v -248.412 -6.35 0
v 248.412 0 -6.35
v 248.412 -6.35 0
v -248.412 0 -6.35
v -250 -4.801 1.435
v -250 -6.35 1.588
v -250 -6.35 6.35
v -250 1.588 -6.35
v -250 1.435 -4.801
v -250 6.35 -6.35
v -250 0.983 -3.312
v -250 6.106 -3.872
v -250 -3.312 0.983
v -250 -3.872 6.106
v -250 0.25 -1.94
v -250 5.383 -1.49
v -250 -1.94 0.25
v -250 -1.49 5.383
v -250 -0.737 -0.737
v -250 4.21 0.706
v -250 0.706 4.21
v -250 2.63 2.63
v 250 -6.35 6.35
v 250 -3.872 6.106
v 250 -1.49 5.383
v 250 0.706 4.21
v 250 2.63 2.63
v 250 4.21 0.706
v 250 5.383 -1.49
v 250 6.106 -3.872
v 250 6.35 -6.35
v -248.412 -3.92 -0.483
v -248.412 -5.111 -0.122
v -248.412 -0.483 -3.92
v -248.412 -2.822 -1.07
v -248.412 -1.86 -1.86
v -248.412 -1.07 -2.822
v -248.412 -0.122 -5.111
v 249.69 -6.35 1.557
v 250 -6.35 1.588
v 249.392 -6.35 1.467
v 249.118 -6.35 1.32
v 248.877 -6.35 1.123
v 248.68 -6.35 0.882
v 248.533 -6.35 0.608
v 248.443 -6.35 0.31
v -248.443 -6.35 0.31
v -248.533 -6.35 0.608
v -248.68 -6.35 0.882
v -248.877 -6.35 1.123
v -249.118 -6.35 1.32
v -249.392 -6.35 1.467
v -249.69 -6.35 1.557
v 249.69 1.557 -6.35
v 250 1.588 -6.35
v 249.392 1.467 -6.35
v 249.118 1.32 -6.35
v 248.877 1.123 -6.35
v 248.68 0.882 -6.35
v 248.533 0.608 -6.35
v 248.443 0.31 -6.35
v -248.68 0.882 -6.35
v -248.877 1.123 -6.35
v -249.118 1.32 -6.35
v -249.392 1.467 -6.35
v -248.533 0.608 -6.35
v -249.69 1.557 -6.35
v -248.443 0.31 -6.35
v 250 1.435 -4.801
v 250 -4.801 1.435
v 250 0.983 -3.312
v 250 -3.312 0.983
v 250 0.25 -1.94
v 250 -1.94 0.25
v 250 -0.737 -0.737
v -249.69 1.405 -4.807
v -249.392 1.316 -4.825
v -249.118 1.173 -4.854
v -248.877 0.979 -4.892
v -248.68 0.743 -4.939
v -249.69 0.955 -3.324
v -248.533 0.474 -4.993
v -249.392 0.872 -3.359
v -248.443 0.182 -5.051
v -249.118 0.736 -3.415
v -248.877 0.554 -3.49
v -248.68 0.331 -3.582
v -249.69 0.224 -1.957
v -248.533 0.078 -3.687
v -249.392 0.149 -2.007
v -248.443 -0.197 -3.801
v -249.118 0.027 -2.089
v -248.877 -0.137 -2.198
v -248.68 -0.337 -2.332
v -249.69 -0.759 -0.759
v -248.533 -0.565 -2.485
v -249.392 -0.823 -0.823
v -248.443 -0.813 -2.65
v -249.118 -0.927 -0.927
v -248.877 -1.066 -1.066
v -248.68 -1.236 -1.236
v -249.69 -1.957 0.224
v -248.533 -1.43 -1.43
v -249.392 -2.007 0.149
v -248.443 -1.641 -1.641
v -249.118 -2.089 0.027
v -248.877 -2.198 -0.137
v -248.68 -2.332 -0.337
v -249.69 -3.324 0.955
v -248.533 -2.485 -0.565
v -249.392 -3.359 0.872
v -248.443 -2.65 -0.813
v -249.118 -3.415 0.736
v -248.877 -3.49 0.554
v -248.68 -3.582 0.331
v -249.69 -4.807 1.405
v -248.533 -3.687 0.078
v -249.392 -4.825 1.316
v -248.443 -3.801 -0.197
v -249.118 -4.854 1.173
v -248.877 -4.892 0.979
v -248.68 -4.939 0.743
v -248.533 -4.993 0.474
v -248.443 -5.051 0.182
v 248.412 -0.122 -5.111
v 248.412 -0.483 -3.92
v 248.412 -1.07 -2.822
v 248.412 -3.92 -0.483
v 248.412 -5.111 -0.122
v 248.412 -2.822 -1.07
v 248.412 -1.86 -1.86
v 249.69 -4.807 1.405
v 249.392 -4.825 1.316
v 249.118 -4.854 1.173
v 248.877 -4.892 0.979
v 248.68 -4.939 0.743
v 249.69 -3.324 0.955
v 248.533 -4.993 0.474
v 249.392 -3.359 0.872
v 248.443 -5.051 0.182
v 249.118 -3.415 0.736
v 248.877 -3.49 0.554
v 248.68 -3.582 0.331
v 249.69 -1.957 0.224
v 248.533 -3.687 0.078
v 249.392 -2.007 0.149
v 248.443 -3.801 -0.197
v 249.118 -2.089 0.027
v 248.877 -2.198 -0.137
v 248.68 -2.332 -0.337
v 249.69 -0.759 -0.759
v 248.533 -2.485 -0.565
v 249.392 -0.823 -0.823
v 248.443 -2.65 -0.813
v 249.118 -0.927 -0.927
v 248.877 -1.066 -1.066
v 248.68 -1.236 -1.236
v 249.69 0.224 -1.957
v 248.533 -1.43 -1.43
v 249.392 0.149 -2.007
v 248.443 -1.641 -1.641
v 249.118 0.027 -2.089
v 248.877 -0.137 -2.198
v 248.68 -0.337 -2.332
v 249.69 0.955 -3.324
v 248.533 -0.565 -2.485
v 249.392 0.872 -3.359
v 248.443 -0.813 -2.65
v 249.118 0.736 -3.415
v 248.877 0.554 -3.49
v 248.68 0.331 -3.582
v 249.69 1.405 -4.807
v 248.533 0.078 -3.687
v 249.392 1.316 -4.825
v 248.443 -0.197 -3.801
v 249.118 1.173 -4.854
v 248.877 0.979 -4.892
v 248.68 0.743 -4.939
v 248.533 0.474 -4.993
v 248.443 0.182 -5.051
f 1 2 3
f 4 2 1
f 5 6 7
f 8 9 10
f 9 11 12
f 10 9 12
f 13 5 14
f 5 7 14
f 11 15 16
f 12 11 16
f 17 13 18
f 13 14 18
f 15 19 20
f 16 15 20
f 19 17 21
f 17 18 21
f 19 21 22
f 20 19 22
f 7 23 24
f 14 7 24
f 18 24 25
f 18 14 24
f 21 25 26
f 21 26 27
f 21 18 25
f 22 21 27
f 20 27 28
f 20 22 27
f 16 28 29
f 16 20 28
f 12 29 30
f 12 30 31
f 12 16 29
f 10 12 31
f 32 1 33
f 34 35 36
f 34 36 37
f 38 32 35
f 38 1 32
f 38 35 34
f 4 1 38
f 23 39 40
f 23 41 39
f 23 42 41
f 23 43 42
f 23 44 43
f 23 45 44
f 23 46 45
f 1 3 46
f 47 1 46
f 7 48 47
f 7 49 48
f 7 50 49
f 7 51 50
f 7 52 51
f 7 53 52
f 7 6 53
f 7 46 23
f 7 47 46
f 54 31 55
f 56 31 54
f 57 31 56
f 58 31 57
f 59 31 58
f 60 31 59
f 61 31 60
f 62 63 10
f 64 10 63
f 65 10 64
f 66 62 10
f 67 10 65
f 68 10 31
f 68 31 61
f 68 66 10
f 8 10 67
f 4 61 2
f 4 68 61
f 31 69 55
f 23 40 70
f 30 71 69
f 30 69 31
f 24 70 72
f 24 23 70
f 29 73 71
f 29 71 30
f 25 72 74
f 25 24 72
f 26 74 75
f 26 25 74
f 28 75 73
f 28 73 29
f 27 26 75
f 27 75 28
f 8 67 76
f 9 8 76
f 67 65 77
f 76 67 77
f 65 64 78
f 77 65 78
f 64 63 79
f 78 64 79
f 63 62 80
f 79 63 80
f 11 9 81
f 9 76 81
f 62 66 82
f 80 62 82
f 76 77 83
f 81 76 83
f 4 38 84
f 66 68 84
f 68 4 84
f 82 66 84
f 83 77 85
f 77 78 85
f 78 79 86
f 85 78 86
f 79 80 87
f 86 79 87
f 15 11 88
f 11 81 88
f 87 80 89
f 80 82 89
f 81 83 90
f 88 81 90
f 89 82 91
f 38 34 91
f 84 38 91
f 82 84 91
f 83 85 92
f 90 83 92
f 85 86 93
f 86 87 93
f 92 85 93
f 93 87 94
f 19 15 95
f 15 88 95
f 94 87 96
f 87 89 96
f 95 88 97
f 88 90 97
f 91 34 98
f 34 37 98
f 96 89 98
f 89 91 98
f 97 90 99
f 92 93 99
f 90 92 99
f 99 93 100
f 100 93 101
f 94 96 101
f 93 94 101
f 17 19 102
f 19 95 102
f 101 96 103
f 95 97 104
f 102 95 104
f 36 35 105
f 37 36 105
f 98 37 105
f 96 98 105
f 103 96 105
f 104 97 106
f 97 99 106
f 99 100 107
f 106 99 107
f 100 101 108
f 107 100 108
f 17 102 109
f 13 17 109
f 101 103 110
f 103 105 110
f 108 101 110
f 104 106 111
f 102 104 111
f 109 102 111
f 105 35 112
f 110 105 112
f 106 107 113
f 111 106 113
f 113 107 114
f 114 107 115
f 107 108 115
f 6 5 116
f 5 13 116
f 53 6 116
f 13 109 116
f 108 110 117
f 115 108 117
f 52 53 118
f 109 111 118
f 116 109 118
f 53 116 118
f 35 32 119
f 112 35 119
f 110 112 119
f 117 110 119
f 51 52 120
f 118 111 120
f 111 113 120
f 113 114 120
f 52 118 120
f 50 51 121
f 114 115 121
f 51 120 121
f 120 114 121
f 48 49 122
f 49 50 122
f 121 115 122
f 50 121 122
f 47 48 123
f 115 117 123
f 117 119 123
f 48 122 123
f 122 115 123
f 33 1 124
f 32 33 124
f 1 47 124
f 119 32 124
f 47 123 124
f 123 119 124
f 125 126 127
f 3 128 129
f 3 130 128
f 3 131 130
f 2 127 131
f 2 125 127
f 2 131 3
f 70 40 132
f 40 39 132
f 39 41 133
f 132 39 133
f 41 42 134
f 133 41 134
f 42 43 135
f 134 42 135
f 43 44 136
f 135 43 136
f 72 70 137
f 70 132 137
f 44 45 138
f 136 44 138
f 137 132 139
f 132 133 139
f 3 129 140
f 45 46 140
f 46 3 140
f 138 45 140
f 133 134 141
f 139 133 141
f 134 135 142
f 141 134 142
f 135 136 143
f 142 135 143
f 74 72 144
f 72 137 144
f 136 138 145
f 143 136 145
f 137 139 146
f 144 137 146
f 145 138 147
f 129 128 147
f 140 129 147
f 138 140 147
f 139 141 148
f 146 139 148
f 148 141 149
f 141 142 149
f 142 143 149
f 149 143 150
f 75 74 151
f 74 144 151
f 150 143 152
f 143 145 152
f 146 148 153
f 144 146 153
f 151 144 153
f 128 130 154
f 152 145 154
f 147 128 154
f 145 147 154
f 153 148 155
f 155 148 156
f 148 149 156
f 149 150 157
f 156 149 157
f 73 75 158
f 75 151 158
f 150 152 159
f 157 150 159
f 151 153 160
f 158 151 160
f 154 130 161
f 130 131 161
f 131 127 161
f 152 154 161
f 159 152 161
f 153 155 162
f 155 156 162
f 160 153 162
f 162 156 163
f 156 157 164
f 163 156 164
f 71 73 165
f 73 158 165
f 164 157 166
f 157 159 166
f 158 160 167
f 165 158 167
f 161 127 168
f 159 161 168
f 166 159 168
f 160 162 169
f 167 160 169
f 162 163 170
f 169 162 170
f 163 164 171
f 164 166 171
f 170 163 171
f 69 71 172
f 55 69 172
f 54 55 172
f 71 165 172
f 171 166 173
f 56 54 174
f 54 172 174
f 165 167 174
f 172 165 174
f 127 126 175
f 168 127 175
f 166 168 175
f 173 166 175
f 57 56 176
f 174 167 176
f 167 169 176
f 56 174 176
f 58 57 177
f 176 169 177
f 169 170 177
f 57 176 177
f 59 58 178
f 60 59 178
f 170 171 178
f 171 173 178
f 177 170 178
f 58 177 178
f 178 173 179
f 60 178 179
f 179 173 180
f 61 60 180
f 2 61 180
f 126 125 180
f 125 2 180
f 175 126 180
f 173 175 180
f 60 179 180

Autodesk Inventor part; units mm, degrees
ref_plane "YZ Plane" through (0, 0, 0) normal (1, 0, 0) x (0, 1, 0)
ref_plane "XZ Plane" through (0, 0, 0) normal (0, 1, 0) x (-1, 0, 0)
ref_plane "XY Plane" through (0, 0, 0) normal (0, 0, 1) x (1, 0, 0)
sketch "Sketch1" plane through (0, 0, 0) normal (1, 0, 0) x (0, 1, 0)
  line L0 (-6.35, 6.35) -> (6.35, 6.35)
  line L1 (6.35, 6.35) -> (6.35, -6.35)
  line L2 (6.35, -6.35) -> (-6.35, -6.35)
  line L3 (-6.35, -6.35) -> (-6.35, 6.35)
  line L4 (-6.35, 6.35) -> (6.35, -6.35) construction
  line L5 (6.35, 6.35) -> (-6.35, -6.35) construction
  point P0 (0, 0)
  dimension "d0" = 12.7
  dimension "d1" = 12.7
extrude "Extrusion1" add sketch "Sketch1" along normal mid plane 500
chamfer "Chamfer1" distance 6.35 angle 45 1 edges at (0, -6.35, -6.35)
fillet "Fillet1" radius 12.7 1 edges at (0, 6.35, 6.35)
sketch "Sketch2" plane through (250, 0, -6.35) normal (0, 0, -1) x (-1, 0, 0)
  line L0 (500, 0) -> (0, 0) projected
  line L1 (500, 6.35) -> (500, 0) projected
  line L2 (0, 6.35) -> (500, 6.35) projected
  line L3 (0, 0) -> (0, 6.35) projected
  circle A0 centre (500, 0) radius 1.5875
  line L4 (0, -6.35) -> (500, -6.35) projected
  line L5 (500, 0) -> (0, 0) projected
  line L6 (498.4125, 0) -> (498.4125, -6.35)
  line L7 (501.5875, 0) -> (501.5875, -6.35)
  line L8 (501.5875, -6.35) -> (498.4125, -6.35)
  point P0 (250, 0)
  dimension "d8" = 3.175
revolve "Revolution1" cut sketch "Sketch2" angle 360 about axis through (250, -6.35, -6.35) along (-1, 0, 0) contours L1 A0 L0 | L0 A0 L1 | A0 L7 L8 L4 L6
mirror "Mirror1" about plane through (0, 0, 0) normal (1, 0, 0) of "Revolution1"
equation "\"d0\" = facingThickness"
equation "\"d1\" = facingThickness"
equation "\"d2\" = depth"
equation "\"d4\" = 0.5 * facingThickness"
equation "\"d7\" = facingThickness"
equation "\"d8\" = 0.25 * facingThickness"
equation "\"depth\" = 500"
equation "\"facingThickness\" = 12.7"
equation "\"facingGasketThickness\" = 1.5875"
properties part number "sideMoulding" material "Wood (Cherry)"
